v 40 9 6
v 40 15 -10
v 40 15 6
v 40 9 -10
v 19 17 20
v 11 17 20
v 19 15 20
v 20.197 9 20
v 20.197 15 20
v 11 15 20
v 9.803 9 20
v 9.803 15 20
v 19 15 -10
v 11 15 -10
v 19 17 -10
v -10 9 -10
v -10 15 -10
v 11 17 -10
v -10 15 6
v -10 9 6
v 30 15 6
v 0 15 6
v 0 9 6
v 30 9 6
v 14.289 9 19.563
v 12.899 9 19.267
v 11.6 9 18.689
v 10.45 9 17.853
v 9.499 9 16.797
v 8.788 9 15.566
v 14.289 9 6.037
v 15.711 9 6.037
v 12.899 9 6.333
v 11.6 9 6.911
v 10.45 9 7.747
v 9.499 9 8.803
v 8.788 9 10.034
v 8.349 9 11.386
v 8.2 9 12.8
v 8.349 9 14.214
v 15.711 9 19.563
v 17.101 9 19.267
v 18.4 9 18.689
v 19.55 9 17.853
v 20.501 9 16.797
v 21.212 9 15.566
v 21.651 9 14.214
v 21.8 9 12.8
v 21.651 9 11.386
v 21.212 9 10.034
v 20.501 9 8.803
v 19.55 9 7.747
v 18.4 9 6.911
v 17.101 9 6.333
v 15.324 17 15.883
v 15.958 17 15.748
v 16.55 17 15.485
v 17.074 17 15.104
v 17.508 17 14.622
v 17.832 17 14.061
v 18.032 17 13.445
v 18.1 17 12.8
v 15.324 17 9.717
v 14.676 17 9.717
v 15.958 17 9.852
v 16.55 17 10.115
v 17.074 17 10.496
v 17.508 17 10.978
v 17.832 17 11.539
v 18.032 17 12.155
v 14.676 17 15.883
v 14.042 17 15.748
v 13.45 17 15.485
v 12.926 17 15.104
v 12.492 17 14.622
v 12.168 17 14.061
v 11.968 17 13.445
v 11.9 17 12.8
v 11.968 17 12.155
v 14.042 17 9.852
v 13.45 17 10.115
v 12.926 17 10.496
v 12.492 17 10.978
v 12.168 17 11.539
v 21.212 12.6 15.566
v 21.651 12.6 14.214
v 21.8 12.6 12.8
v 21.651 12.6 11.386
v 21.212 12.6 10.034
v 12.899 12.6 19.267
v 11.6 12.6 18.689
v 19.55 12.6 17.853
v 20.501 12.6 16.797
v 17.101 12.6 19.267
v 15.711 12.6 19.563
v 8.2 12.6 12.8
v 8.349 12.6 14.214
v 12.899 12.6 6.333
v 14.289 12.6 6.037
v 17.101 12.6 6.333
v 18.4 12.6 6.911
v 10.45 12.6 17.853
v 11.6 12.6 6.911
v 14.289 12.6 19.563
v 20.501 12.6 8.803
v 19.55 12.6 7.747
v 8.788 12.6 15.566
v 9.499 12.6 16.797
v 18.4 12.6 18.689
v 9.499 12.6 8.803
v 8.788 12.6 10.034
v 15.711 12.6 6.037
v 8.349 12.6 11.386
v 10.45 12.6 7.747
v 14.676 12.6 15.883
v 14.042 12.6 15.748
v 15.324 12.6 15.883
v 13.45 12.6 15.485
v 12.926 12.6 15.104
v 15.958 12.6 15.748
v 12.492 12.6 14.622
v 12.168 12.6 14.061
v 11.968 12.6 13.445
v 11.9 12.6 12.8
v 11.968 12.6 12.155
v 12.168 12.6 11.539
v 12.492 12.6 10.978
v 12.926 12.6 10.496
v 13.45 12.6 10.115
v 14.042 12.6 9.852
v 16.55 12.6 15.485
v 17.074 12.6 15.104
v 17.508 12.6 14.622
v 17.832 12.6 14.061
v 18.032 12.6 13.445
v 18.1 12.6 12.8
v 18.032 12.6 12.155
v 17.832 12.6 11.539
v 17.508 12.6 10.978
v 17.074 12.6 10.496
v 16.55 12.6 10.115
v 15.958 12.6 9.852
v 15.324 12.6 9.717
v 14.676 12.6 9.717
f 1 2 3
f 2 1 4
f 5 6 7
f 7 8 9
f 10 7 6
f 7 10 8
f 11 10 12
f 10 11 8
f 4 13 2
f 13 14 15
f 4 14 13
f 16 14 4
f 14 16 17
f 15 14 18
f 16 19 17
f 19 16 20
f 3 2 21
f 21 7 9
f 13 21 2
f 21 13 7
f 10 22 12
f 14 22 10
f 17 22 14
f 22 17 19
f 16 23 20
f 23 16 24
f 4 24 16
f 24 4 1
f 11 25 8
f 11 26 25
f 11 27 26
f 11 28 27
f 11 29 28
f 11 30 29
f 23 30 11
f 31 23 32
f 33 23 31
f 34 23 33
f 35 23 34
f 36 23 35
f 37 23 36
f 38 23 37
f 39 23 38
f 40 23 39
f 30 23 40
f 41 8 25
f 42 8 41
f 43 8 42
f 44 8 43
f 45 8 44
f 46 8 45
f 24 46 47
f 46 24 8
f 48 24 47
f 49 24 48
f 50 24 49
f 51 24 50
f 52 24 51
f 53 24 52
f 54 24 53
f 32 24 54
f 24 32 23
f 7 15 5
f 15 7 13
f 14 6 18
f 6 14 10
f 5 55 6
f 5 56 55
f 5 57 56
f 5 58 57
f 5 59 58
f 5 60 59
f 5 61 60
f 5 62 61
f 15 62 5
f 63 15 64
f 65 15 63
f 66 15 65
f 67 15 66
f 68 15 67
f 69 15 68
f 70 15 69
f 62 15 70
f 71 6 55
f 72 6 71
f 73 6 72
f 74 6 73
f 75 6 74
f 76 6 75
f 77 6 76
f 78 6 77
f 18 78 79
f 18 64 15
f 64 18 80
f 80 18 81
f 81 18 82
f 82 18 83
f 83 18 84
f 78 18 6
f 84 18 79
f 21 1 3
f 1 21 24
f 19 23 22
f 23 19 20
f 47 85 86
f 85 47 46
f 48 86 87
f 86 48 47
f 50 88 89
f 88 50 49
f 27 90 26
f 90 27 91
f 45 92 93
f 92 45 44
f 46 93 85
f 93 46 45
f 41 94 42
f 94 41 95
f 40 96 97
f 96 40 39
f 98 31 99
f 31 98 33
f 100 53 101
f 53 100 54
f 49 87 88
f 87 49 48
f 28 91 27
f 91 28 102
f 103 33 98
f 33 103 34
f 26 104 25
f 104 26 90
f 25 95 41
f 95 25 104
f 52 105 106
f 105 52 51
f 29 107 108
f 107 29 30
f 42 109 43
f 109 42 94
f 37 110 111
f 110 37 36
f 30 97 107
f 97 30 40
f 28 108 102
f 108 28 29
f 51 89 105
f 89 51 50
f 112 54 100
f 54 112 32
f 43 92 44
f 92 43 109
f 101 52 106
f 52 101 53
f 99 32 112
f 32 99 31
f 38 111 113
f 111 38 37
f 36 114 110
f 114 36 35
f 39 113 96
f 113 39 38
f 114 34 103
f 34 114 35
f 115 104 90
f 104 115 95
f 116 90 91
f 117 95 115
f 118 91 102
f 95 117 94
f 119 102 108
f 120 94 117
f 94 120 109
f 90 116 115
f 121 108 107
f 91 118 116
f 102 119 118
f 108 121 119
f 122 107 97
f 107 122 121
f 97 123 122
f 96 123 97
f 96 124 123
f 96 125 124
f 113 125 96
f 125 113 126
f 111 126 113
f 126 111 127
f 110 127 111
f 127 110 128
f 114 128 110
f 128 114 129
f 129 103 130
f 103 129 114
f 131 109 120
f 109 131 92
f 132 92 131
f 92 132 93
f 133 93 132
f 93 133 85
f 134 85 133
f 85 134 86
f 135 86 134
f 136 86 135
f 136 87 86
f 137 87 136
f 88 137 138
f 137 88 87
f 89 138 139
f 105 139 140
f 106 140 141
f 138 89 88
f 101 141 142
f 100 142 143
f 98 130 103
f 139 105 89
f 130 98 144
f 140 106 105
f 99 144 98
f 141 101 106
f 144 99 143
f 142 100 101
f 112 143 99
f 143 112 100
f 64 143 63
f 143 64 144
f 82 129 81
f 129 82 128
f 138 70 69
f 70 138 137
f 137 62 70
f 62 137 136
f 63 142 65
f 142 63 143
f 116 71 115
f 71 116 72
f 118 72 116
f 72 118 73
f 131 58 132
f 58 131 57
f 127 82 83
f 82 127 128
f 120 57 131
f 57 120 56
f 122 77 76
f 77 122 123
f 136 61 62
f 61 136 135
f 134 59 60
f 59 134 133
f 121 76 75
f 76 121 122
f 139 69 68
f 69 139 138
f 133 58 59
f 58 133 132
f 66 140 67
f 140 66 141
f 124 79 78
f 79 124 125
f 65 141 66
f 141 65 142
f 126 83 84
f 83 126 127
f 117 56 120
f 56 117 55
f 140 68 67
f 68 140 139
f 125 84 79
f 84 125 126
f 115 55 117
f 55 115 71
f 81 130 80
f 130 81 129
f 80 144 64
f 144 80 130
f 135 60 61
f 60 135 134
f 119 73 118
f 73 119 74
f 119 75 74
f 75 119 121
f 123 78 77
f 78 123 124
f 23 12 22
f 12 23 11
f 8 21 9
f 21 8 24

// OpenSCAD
// file: ../configuration.scad
// Vyska vrstvy pro tisknuti dilu [mm]
layer_height = 0.3; //Slic3r->Print Settings->Layers and perimeters->Layer height

// Rezerva prumeru hlavy sroubu [mm]
spare = 1;
// Prumer hlavy M6 sroubu (pricte se rezerva) [mm]
M6_head_diameter = 12.6+spare;
//M6_head_diameter = 12+spare;

// Vyska hlavy M6 sroubu (dulezite pro zapusteni hlavy sroubu do plastu) [mm]
M6_head_height = 3.6;
//M6_head_height = 4.5;

// Delka motoru (ovlivni dily pro osy Z a Y)
//SX17-1003LQFE (doporuceno hlavne na osu Z)
motor_length = 29.5;
//SX17-1003 (doporuceno hlavne na osu Z)
//motor_length = 34;
//SX17-1005
//motor_length = 40;
//SX17-0905 - zde je jiz problem s velkou vyskou motoru na ose Z - musi se upravit endstop-holder
//motor_length = 48;

// Sirka vytlacovaneho materialu [mm]
extrusion_width = 0.66; //Slic3r->Print Settings->Advanced->Default extrusion width

/// Vyberte typ remenu ******************************************************

// GT2 
//belt_tooth_distance = 2;
//belt_tooth_ratio = 0.5;

// T2.5
belt_tooth_distance = 2.5;
belt_tooth_ratio = 0.68;
// main file
// RebeliX
//
// RAMPS mini drzak
// GNU GPL v3
// Martin Neruda <neruda@reprap4u.cz>
// http://www.reprap4u.cz

include <../configuration.scad>

module bottom_holder_base(vyska,sirka,delka){
	// Pridelani do profilu
	translate([-10,delka-6,-10]) cube([50,6,30]);
	// Vodici lista
	translate([15-4,delka,-10]) cube([8,2,30]);
}

module bottom_holder_cuts(vyska,delka,vyrez_sirka){
	translate([-3.5,3,vyska-3]) cube([vyrez_sirka,1.9,5]);

	translate([30,delka-7,6]) cube([50,8,30]);
	translate([-50,delka-7,6]) cube([50,8,30]);
	// Otvor pro M6 sroub
	translate([15,delka-6+M6_head_height,vyska+M6_head_diameter/2]) rotate([90,0,0]) cylinder(r=M6_head_diameter/2,h=10,$fn=30);
	translate([15,0,vyska+M6_head_diameter/2]) rotate([-90,0,0]) cylinder(r=3.1,h=20,$fn=30);
	// Uspora plastu
	translate([0,0,vyska]) rotate([0,-55,0]) cube([30,30,30]);
	translate([30,0,vyska]) rotate([0,-35,0]) cube([30,30,30]);	
}

difference(){
	bottom_holder_base(6,19,15);
	bottom_holder_cuts(6,15,40);
}
